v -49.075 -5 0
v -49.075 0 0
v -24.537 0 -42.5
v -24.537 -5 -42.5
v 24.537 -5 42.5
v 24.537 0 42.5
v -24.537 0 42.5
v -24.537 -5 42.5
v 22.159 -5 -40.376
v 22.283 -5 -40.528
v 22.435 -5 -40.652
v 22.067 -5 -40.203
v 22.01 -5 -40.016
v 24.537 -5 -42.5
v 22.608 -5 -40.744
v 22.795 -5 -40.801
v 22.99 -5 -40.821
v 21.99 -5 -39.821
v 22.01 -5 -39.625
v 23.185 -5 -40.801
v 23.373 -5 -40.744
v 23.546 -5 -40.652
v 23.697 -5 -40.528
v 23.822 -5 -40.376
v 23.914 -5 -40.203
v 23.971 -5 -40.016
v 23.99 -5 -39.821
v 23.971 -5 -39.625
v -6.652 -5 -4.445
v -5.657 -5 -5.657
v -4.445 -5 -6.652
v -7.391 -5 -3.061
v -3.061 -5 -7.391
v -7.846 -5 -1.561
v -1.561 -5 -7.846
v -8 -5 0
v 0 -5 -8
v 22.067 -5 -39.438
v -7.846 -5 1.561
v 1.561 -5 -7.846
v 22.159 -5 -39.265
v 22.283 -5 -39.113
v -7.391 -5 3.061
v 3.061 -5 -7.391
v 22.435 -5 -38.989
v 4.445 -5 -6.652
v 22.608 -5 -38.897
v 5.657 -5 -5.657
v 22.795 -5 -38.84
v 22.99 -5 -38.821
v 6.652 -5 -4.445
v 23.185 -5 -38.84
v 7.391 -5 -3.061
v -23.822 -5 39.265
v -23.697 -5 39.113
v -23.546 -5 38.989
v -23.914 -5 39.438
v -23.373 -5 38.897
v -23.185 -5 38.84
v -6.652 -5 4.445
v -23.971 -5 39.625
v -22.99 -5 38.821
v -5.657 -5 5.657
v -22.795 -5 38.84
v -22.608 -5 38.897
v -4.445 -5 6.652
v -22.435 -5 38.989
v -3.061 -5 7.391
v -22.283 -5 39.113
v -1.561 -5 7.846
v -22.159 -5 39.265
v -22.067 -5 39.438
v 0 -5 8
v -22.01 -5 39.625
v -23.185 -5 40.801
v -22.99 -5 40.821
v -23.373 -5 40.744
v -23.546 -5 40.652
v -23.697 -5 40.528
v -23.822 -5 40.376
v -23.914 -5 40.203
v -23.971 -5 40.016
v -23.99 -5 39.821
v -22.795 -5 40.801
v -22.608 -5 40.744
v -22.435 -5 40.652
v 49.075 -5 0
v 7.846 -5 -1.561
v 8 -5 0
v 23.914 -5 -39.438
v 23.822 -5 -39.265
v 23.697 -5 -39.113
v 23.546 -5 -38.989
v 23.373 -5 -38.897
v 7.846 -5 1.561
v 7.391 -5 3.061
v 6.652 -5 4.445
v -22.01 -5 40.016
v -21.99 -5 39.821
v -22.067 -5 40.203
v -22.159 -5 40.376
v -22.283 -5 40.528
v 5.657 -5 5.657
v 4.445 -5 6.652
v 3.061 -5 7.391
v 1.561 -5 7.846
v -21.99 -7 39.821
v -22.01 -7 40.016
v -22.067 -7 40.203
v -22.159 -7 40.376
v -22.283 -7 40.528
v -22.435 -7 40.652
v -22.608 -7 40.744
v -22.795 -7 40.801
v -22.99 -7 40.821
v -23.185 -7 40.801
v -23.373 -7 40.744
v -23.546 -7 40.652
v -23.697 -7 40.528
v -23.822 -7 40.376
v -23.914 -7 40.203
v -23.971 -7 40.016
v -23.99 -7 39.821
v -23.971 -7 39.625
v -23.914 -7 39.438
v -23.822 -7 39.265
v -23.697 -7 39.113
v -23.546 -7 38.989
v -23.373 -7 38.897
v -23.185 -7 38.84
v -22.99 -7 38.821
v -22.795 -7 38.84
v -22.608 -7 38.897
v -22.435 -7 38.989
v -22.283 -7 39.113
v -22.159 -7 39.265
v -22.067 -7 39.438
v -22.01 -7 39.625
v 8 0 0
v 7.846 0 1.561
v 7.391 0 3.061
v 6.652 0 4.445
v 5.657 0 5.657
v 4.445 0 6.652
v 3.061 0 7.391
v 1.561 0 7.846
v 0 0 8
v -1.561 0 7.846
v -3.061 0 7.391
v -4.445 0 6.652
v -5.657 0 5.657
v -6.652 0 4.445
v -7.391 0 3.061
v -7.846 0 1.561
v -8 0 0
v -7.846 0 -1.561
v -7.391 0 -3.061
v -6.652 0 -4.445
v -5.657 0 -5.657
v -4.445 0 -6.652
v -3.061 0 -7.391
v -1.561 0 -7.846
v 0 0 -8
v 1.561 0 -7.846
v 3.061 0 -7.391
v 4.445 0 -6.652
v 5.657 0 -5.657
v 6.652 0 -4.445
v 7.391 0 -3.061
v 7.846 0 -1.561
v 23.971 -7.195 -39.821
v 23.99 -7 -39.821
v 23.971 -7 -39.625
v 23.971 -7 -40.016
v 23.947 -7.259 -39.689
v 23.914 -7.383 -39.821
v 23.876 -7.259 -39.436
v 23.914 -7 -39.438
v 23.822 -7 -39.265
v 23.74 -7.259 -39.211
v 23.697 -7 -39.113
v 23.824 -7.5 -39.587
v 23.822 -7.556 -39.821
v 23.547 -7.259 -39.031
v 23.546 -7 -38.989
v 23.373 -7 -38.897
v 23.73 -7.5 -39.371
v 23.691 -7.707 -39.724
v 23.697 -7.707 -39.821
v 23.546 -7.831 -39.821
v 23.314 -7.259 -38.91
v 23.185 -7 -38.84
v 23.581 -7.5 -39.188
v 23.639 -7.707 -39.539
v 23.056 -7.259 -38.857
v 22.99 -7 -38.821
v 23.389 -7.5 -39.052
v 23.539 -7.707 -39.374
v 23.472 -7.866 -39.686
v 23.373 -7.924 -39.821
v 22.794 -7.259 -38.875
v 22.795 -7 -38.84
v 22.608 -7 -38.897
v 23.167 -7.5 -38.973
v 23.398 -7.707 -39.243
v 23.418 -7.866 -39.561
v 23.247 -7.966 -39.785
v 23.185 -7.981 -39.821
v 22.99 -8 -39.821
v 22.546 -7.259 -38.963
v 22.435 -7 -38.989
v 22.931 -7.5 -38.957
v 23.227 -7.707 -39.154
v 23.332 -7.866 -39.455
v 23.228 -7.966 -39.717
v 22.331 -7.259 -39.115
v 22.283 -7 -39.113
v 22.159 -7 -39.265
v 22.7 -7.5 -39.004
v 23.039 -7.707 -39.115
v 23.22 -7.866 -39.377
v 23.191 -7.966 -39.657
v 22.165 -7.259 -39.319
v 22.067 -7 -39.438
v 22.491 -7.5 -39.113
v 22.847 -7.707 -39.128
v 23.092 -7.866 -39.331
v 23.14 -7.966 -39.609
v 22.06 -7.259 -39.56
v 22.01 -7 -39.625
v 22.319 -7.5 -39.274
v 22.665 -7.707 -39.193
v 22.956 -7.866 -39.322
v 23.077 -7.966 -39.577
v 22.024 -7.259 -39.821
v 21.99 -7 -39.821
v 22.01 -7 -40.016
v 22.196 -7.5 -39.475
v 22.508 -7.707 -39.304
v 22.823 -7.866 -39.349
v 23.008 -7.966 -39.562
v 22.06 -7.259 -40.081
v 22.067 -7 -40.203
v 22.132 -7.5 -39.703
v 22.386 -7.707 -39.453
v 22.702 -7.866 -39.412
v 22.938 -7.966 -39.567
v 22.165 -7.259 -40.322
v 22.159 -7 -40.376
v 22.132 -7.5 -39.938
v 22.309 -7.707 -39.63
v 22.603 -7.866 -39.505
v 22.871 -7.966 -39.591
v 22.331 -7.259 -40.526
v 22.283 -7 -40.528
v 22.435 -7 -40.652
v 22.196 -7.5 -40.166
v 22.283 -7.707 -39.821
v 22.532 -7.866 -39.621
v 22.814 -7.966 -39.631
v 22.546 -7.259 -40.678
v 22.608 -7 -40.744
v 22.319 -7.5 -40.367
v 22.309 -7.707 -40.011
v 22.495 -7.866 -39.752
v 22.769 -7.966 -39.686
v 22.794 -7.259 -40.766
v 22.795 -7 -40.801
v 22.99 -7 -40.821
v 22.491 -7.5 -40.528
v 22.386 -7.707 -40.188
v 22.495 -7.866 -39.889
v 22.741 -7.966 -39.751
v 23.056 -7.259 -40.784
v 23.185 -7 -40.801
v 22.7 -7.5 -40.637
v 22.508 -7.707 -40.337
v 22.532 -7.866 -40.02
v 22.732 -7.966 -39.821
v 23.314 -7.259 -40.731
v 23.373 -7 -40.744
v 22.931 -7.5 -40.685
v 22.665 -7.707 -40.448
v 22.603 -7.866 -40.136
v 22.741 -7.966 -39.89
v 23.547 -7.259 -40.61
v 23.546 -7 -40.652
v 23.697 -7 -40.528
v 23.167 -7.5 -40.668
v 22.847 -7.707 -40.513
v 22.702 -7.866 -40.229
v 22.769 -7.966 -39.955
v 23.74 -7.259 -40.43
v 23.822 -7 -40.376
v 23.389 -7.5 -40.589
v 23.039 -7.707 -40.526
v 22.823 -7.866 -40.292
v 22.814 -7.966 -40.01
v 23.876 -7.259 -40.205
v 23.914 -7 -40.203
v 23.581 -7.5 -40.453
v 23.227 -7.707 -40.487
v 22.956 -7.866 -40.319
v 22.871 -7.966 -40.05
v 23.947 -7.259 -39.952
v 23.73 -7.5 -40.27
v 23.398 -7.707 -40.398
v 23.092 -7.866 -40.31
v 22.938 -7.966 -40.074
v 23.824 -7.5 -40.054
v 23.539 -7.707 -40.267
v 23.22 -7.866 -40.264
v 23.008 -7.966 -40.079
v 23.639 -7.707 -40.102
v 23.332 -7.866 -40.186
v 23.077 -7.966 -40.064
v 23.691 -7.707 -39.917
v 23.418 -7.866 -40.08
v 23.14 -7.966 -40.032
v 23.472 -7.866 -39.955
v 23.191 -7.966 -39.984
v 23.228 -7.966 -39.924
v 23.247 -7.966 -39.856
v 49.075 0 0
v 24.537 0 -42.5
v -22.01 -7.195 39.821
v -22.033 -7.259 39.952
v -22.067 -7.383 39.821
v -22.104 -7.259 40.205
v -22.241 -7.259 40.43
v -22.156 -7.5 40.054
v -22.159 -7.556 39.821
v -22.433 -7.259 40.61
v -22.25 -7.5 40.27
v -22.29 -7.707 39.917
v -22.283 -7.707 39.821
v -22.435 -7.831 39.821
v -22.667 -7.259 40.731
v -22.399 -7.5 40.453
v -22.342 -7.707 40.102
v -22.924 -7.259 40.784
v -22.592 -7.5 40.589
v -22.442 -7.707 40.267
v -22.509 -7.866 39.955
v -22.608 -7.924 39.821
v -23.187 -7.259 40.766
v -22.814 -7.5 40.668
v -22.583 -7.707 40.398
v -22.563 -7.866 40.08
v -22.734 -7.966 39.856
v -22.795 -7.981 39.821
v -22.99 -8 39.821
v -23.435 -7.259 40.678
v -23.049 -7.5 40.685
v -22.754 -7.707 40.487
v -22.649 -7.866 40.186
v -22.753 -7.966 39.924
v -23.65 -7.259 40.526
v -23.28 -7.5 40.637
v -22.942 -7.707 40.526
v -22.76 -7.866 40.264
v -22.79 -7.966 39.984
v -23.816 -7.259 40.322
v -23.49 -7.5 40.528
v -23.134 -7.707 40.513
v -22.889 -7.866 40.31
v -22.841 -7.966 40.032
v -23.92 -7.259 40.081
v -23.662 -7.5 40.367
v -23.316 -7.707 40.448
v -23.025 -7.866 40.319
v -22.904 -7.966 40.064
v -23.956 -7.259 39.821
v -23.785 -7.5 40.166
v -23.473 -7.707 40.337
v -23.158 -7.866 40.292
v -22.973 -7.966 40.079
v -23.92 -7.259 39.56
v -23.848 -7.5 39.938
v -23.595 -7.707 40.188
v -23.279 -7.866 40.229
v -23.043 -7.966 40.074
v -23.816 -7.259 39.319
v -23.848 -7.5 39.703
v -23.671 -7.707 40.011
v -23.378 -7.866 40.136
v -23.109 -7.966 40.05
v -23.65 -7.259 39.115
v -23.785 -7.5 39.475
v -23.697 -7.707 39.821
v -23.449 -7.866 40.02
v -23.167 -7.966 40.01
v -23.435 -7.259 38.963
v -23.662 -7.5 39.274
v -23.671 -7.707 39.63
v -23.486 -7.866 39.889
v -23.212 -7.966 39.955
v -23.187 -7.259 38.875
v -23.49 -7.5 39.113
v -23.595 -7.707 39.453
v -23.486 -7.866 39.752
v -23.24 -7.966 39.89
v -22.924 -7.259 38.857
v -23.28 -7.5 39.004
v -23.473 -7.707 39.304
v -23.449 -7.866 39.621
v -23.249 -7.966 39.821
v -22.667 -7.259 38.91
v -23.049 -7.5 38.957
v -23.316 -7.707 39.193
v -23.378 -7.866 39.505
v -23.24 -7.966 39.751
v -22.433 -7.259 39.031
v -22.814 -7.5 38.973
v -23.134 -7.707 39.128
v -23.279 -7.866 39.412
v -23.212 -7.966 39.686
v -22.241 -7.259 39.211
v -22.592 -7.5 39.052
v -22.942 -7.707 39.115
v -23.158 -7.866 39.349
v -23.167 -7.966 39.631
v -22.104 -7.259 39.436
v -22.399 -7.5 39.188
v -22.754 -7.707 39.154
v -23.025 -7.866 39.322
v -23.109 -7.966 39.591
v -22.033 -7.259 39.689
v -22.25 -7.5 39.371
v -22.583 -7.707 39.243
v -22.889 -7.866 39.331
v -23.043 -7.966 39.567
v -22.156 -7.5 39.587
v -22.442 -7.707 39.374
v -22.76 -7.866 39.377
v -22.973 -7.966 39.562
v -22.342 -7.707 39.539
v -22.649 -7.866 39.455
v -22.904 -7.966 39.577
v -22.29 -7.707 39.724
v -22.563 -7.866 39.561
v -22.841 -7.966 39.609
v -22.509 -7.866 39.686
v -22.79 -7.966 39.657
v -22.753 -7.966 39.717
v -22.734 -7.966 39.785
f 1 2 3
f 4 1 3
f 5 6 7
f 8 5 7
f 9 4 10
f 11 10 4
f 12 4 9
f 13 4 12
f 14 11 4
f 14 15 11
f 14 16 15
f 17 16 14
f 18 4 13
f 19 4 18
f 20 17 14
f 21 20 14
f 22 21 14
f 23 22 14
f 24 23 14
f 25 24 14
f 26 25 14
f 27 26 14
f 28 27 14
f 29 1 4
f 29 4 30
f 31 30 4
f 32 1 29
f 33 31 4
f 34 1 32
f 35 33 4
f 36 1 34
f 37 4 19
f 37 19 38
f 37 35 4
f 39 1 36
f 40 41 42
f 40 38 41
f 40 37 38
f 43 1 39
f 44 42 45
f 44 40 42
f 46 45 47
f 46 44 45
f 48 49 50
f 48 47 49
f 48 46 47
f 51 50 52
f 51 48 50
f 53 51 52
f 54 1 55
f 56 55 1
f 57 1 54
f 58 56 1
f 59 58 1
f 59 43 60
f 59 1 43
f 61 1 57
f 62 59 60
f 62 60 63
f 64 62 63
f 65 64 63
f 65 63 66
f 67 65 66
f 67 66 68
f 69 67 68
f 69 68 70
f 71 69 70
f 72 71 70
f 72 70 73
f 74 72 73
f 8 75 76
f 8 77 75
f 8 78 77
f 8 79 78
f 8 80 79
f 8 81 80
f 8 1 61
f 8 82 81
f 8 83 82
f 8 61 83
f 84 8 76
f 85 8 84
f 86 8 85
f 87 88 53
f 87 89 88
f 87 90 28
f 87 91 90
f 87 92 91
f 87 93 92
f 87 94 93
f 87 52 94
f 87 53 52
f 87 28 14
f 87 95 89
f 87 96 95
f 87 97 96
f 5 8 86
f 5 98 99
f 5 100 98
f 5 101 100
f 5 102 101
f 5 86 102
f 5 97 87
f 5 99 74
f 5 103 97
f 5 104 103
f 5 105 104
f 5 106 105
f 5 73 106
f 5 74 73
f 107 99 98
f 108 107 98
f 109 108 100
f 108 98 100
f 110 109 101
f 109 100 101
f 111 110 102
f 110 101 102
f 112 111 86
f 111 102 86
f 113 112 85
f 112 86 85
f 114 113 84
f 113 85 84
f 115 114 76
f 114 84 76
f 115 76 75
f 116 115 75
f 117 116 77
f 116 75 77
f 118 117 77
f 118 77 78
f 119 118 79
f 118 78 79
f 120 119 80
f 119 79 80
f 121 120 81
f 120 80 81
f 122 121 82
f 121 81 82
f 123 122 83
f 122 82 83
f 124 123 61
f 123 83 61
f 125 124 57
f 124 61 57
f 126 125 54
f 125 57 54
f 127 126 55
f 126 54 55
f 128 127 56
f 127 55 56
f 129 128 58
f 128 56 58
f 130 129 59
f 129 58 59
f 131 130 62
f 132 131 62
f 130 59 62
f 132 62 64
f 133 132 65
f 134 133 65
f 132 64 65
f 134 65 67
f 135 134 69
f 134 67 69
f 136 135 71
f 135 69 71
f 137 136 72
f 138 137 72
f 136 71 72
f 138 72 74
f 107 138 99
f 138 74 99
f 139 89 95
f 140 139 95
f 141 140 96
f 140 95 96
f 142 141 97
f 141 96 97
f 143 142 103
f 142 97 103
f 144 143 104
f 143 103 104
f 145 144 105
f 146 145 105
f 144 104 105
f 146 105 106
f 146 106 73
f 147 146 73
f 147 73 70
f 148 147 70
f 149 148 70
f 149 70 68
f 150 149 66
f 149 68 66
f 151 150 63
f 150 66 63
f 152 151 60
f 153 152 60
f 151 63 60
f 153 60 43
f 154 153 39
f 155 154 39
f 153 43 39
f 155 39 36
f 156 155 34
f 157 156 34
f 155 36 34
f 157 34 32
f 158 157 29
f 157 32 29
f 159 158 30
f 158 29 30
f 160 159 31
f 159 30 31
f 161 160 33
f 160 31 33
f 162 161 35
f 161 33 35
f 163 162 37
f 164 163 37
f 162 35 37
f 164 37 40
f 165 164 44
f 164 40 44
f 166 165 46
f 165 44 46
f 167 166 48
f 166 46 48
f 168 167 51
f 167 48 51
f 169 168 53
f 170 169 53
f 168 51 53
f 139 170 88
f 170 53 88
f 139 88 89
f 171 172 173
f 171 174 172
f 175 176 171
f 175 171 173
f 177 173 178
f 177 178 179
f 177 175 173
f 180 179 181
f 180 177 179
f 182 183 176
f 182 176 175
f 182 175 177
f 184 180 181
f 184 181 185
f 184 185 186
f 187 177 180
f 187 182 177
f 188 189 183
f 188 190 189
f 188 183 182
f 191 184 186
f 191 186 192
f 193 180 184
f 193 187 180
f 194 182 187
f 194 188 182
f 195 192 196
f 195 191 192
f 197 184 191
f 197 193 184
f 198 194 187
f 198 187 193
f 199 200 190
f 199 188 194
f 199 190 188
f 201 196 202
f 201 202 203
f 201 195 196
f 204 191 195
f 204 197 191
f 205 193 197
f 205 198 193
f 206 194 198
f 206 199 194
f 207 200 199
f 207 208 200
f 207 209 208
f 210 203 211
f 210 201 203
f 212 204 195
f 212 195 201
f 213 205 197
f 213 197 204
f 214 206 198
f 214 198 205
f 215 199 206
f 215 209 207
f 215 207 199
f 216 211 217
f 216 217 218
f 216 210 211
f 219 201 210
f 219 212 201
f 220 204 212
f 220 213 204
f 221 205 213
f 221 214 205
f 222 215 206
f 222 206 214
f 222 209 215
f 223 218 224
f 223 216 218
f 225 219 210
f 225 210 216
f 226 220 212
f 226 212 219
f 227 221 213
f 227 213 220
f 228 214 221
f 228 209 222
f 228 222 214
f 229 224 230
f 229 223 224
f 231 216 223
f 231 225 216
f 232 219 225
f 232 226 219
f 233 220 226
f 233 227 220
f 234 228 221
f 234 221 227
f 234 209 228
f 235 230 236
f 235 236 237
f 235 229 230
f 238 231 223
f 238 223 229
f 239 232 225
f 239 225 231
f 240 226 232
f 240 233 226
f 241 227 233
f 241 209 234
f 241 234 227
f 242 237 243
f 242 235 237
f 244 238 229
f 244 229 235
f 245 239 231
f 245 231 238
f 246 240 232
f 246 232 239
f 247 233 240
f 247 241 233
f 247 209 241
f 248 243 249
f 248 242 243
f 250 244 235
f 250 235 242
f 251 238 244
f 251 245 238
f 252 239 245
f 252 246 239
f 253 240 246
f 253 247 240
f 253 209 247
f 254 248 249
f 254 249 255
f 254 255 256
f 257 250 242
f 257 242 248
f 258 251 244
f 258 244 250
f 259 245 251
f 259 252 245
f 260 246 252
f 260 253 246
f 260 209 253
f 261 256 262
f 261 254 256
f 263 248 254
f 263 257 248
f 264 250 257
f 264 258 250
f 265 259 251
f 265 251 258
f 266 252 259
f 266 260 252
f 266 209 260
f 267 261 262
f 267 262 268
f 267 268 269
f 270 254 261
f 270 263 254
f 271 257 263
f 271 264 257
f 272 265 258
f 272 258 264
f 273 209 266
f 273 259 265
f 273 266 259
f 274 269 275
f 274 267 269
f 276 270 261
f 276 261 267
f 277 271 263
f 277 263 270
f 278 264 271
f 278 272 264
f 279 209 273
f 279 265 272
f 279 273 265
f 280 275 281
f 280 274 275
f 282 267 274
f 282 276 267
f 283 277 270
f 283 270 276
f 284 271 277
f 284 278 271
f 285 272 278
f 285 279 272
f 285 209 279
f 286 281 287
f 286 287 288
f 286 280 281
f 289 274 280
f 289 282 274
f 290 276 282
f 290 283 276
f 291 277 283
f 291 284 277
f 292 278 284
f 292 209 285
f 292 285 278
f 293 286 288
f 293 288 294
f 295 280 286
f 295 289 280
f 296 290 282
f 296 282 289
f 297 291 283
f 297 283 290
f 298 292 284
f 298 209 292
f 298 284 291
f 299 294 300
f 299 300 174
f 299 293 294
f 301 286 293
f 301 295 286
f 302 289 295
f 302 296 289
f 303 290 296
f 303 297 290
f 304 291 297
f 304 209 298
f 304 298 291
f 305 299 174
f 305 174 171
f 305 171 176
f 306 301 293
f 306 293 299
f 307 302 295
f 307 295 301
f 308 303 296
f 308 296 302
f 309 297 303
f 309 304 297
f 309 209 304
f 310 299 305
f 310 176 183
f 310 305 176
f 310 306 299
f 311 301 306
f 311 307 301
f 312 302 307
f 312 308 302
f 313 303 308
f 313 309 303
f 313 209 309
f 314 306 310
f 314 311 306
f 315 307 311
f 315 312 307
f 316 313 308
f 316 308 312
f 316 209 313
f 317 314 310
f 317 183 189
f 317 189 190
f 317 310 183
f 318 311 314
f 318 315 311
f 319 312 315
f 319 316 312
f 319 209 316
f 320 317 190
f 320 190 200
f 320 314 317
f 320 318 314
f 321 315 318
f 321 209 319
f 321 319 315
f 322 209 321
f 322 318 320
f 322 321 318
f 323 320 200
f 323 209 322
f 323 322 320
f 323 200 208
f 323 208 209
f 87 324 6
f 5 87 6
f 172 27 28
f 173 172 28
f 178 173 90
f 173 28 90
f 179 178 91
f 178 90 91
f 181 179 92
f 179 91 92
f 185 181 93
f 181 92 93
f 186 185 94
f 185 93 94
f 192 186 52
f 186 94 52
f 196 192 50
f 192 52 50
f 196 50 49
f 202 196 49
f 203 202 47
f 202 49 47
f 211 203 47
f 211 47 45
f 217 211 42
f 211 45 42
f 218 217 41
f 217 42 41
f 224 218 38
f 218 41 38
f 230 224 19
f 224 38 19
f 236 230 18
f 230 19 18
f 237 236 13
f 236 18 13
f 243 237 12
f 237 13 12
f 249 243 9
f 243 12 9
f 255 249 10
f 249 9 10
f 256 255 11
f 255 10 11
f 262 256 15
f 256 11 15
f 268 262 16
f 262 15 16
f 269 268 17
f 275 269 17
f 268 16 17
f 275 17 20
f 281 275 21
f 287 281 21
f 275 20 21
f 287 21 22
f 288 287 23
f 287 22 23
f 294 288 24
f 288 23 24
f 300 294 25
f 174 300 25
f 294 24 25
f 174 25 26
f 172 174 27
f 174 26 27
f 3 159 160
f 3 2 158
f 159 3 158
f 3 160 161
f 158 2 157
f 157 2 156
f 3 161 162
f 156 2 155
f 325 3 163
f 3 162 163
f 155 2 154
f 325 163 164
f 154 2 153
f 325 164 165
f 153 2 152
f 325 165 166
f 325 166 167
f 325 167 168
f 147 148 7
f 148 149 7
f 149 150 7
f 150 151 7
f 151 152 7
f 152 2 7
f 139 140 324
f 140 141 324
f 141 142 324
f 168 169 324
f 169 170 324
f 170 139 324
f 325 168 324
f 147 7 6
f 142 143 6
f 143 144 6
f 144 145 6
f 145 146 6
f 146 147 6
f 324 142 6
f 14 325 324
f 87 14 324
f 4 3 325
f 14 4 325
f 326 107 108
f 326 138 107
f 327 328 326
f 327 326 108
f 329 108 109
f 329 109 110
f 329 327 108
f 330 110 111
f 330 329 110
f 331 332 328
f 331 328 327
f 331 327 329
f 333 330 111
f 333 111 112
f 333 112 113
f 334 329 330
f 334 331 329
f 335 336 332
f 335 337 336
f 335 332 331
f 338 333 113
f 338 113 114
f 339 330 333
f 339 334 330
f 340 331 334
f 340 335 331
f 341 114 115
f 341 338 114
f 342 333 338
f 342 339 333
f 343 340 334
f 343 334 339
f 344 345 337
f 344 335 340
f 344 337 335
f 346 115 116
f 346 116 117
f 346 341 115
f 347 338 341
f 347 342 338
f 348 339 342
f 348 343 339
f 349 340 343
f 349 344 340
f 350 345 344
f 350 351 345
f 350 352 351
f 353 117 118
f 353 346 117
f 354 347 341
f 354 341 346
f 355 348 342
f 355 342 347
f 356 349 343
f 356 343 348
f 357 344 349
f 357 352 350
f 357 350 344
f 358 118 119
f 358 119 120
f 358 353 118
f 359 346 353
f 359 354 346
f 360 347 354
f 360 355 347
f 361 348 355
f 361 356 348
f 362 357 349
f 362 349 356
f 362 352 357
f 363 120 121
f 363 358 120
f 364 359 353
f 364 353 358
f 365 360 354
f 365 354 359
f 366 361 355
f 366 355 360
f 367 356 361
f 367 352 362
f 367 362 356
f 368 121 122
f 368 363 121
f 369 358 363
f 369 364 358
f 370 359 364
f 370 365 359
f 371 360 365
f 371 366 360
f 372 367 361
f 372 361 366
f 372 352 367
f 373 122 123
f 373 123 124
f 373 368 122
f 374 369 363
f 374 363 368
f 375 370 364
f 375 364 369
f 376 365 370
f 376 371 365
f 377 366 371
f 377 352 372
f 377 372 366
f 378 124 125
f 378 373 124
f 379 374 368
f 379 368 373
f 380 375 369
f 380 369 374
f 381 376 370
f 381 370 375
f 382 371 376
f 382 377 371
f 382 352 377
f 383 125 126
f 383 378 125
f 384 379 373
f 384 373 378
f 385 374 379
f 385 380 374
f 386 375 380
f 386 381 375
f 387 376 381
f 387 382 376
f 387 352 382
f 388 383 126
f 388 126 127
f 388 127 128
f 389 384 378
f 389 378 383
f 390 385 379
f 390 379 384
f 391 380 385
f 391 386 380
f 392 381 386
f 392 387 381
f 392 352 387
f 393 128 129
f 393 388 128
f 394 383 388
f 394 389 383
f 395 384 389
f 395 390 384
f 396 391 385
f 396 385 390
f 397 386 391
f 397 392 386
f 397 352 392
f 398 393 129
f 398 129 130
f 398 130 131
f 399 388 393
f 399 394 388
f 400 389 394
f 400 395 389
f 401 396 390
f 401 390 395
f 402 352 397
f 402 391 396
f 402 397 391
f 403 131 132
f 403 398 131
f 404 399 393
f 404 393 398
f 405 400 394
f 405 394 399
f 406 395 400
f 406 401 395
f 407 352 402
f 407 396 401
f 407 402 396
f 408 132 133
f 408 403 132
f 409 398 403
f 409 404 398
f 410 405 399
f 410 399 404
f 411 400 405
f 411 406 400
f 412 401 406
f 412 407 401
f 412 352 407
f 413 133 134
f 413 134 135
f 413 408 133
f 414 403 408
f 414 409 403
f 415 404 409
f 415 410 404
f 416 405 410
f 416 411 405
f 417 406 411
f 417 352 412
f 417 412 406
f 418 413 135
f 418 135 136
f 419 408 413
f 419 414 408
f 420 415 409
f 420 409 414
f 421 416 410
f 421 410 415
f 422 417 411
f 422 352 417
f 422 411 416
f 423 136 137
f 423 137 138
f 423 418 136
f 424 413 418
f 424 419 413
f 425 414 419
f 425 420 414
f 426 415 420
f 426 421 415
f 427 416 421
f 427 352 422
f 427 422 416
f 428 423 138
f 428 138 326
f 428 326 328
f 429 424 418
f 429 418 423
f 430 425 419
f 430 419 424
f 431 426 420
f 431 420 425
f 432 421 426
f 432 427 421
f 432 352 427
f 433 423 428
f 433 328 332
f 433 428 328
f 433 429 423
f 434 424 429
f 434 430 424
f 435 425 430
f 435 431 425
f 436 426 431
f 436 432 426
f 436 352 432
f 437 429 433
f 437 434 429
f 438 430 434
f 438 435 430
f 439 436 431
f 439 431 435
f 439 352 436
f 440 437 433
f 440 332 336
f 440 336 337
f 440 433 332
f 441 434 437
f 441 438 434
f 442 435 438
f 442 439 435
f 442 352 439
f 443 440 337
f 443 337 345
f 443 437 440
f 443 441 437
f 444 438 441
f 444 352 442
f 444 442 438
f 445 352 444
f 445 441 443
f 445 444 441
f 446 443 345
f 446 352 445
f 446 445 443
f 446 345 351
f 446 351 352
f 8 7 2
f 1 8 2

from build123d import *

# Parameters (mm, degrees)
F1_DEPTH = 5
F2_R     = 8
F3_DEPTH = 5
F6_R     = 1
F7_DEPTH = 3
F8_R     = 1


with BuildPart() as f1:
    # F0 (on Front) → F1 (new body)
    with BuildSketch(Plane.XZ):
        Polygon((24.537386, -42.5), (49.074773, 0), (24.537386, 42.5), (-24.537386, 42.5), (-49.074773, 0), (-24.537386, -42.5), align=None)
    extrude(amount=F1_DEPTH)

    # F2 (on face) → F3 (cut)
    with BuildSketch(Plane.XZ.offset(5)):
        Circle(F2_R)
    extrude(amount=-F3_DEPTH, mode=Mode.SUBTRACT)

    # F6 (on face) → F7 (join)
    with BuildSketch(Plane.XZ.offset(5)):
        with Locations((-22.990381, 39.820508)):
            Circle(F6_R)
        with Locations((22.990381, -39.820508)):
            Circle(F6_R)
    extrude(amount=F7_DEPTH)

    # F8
    f8_edges = [f1.edges().sort_by_distance(p)[0] for p in [
        (-23.990381, -8, 39.820508),
        (21.990381, -8, -39.820508),
    ]]
    fillet(f8_edges, radius=F8_R)


solid = f1.part
